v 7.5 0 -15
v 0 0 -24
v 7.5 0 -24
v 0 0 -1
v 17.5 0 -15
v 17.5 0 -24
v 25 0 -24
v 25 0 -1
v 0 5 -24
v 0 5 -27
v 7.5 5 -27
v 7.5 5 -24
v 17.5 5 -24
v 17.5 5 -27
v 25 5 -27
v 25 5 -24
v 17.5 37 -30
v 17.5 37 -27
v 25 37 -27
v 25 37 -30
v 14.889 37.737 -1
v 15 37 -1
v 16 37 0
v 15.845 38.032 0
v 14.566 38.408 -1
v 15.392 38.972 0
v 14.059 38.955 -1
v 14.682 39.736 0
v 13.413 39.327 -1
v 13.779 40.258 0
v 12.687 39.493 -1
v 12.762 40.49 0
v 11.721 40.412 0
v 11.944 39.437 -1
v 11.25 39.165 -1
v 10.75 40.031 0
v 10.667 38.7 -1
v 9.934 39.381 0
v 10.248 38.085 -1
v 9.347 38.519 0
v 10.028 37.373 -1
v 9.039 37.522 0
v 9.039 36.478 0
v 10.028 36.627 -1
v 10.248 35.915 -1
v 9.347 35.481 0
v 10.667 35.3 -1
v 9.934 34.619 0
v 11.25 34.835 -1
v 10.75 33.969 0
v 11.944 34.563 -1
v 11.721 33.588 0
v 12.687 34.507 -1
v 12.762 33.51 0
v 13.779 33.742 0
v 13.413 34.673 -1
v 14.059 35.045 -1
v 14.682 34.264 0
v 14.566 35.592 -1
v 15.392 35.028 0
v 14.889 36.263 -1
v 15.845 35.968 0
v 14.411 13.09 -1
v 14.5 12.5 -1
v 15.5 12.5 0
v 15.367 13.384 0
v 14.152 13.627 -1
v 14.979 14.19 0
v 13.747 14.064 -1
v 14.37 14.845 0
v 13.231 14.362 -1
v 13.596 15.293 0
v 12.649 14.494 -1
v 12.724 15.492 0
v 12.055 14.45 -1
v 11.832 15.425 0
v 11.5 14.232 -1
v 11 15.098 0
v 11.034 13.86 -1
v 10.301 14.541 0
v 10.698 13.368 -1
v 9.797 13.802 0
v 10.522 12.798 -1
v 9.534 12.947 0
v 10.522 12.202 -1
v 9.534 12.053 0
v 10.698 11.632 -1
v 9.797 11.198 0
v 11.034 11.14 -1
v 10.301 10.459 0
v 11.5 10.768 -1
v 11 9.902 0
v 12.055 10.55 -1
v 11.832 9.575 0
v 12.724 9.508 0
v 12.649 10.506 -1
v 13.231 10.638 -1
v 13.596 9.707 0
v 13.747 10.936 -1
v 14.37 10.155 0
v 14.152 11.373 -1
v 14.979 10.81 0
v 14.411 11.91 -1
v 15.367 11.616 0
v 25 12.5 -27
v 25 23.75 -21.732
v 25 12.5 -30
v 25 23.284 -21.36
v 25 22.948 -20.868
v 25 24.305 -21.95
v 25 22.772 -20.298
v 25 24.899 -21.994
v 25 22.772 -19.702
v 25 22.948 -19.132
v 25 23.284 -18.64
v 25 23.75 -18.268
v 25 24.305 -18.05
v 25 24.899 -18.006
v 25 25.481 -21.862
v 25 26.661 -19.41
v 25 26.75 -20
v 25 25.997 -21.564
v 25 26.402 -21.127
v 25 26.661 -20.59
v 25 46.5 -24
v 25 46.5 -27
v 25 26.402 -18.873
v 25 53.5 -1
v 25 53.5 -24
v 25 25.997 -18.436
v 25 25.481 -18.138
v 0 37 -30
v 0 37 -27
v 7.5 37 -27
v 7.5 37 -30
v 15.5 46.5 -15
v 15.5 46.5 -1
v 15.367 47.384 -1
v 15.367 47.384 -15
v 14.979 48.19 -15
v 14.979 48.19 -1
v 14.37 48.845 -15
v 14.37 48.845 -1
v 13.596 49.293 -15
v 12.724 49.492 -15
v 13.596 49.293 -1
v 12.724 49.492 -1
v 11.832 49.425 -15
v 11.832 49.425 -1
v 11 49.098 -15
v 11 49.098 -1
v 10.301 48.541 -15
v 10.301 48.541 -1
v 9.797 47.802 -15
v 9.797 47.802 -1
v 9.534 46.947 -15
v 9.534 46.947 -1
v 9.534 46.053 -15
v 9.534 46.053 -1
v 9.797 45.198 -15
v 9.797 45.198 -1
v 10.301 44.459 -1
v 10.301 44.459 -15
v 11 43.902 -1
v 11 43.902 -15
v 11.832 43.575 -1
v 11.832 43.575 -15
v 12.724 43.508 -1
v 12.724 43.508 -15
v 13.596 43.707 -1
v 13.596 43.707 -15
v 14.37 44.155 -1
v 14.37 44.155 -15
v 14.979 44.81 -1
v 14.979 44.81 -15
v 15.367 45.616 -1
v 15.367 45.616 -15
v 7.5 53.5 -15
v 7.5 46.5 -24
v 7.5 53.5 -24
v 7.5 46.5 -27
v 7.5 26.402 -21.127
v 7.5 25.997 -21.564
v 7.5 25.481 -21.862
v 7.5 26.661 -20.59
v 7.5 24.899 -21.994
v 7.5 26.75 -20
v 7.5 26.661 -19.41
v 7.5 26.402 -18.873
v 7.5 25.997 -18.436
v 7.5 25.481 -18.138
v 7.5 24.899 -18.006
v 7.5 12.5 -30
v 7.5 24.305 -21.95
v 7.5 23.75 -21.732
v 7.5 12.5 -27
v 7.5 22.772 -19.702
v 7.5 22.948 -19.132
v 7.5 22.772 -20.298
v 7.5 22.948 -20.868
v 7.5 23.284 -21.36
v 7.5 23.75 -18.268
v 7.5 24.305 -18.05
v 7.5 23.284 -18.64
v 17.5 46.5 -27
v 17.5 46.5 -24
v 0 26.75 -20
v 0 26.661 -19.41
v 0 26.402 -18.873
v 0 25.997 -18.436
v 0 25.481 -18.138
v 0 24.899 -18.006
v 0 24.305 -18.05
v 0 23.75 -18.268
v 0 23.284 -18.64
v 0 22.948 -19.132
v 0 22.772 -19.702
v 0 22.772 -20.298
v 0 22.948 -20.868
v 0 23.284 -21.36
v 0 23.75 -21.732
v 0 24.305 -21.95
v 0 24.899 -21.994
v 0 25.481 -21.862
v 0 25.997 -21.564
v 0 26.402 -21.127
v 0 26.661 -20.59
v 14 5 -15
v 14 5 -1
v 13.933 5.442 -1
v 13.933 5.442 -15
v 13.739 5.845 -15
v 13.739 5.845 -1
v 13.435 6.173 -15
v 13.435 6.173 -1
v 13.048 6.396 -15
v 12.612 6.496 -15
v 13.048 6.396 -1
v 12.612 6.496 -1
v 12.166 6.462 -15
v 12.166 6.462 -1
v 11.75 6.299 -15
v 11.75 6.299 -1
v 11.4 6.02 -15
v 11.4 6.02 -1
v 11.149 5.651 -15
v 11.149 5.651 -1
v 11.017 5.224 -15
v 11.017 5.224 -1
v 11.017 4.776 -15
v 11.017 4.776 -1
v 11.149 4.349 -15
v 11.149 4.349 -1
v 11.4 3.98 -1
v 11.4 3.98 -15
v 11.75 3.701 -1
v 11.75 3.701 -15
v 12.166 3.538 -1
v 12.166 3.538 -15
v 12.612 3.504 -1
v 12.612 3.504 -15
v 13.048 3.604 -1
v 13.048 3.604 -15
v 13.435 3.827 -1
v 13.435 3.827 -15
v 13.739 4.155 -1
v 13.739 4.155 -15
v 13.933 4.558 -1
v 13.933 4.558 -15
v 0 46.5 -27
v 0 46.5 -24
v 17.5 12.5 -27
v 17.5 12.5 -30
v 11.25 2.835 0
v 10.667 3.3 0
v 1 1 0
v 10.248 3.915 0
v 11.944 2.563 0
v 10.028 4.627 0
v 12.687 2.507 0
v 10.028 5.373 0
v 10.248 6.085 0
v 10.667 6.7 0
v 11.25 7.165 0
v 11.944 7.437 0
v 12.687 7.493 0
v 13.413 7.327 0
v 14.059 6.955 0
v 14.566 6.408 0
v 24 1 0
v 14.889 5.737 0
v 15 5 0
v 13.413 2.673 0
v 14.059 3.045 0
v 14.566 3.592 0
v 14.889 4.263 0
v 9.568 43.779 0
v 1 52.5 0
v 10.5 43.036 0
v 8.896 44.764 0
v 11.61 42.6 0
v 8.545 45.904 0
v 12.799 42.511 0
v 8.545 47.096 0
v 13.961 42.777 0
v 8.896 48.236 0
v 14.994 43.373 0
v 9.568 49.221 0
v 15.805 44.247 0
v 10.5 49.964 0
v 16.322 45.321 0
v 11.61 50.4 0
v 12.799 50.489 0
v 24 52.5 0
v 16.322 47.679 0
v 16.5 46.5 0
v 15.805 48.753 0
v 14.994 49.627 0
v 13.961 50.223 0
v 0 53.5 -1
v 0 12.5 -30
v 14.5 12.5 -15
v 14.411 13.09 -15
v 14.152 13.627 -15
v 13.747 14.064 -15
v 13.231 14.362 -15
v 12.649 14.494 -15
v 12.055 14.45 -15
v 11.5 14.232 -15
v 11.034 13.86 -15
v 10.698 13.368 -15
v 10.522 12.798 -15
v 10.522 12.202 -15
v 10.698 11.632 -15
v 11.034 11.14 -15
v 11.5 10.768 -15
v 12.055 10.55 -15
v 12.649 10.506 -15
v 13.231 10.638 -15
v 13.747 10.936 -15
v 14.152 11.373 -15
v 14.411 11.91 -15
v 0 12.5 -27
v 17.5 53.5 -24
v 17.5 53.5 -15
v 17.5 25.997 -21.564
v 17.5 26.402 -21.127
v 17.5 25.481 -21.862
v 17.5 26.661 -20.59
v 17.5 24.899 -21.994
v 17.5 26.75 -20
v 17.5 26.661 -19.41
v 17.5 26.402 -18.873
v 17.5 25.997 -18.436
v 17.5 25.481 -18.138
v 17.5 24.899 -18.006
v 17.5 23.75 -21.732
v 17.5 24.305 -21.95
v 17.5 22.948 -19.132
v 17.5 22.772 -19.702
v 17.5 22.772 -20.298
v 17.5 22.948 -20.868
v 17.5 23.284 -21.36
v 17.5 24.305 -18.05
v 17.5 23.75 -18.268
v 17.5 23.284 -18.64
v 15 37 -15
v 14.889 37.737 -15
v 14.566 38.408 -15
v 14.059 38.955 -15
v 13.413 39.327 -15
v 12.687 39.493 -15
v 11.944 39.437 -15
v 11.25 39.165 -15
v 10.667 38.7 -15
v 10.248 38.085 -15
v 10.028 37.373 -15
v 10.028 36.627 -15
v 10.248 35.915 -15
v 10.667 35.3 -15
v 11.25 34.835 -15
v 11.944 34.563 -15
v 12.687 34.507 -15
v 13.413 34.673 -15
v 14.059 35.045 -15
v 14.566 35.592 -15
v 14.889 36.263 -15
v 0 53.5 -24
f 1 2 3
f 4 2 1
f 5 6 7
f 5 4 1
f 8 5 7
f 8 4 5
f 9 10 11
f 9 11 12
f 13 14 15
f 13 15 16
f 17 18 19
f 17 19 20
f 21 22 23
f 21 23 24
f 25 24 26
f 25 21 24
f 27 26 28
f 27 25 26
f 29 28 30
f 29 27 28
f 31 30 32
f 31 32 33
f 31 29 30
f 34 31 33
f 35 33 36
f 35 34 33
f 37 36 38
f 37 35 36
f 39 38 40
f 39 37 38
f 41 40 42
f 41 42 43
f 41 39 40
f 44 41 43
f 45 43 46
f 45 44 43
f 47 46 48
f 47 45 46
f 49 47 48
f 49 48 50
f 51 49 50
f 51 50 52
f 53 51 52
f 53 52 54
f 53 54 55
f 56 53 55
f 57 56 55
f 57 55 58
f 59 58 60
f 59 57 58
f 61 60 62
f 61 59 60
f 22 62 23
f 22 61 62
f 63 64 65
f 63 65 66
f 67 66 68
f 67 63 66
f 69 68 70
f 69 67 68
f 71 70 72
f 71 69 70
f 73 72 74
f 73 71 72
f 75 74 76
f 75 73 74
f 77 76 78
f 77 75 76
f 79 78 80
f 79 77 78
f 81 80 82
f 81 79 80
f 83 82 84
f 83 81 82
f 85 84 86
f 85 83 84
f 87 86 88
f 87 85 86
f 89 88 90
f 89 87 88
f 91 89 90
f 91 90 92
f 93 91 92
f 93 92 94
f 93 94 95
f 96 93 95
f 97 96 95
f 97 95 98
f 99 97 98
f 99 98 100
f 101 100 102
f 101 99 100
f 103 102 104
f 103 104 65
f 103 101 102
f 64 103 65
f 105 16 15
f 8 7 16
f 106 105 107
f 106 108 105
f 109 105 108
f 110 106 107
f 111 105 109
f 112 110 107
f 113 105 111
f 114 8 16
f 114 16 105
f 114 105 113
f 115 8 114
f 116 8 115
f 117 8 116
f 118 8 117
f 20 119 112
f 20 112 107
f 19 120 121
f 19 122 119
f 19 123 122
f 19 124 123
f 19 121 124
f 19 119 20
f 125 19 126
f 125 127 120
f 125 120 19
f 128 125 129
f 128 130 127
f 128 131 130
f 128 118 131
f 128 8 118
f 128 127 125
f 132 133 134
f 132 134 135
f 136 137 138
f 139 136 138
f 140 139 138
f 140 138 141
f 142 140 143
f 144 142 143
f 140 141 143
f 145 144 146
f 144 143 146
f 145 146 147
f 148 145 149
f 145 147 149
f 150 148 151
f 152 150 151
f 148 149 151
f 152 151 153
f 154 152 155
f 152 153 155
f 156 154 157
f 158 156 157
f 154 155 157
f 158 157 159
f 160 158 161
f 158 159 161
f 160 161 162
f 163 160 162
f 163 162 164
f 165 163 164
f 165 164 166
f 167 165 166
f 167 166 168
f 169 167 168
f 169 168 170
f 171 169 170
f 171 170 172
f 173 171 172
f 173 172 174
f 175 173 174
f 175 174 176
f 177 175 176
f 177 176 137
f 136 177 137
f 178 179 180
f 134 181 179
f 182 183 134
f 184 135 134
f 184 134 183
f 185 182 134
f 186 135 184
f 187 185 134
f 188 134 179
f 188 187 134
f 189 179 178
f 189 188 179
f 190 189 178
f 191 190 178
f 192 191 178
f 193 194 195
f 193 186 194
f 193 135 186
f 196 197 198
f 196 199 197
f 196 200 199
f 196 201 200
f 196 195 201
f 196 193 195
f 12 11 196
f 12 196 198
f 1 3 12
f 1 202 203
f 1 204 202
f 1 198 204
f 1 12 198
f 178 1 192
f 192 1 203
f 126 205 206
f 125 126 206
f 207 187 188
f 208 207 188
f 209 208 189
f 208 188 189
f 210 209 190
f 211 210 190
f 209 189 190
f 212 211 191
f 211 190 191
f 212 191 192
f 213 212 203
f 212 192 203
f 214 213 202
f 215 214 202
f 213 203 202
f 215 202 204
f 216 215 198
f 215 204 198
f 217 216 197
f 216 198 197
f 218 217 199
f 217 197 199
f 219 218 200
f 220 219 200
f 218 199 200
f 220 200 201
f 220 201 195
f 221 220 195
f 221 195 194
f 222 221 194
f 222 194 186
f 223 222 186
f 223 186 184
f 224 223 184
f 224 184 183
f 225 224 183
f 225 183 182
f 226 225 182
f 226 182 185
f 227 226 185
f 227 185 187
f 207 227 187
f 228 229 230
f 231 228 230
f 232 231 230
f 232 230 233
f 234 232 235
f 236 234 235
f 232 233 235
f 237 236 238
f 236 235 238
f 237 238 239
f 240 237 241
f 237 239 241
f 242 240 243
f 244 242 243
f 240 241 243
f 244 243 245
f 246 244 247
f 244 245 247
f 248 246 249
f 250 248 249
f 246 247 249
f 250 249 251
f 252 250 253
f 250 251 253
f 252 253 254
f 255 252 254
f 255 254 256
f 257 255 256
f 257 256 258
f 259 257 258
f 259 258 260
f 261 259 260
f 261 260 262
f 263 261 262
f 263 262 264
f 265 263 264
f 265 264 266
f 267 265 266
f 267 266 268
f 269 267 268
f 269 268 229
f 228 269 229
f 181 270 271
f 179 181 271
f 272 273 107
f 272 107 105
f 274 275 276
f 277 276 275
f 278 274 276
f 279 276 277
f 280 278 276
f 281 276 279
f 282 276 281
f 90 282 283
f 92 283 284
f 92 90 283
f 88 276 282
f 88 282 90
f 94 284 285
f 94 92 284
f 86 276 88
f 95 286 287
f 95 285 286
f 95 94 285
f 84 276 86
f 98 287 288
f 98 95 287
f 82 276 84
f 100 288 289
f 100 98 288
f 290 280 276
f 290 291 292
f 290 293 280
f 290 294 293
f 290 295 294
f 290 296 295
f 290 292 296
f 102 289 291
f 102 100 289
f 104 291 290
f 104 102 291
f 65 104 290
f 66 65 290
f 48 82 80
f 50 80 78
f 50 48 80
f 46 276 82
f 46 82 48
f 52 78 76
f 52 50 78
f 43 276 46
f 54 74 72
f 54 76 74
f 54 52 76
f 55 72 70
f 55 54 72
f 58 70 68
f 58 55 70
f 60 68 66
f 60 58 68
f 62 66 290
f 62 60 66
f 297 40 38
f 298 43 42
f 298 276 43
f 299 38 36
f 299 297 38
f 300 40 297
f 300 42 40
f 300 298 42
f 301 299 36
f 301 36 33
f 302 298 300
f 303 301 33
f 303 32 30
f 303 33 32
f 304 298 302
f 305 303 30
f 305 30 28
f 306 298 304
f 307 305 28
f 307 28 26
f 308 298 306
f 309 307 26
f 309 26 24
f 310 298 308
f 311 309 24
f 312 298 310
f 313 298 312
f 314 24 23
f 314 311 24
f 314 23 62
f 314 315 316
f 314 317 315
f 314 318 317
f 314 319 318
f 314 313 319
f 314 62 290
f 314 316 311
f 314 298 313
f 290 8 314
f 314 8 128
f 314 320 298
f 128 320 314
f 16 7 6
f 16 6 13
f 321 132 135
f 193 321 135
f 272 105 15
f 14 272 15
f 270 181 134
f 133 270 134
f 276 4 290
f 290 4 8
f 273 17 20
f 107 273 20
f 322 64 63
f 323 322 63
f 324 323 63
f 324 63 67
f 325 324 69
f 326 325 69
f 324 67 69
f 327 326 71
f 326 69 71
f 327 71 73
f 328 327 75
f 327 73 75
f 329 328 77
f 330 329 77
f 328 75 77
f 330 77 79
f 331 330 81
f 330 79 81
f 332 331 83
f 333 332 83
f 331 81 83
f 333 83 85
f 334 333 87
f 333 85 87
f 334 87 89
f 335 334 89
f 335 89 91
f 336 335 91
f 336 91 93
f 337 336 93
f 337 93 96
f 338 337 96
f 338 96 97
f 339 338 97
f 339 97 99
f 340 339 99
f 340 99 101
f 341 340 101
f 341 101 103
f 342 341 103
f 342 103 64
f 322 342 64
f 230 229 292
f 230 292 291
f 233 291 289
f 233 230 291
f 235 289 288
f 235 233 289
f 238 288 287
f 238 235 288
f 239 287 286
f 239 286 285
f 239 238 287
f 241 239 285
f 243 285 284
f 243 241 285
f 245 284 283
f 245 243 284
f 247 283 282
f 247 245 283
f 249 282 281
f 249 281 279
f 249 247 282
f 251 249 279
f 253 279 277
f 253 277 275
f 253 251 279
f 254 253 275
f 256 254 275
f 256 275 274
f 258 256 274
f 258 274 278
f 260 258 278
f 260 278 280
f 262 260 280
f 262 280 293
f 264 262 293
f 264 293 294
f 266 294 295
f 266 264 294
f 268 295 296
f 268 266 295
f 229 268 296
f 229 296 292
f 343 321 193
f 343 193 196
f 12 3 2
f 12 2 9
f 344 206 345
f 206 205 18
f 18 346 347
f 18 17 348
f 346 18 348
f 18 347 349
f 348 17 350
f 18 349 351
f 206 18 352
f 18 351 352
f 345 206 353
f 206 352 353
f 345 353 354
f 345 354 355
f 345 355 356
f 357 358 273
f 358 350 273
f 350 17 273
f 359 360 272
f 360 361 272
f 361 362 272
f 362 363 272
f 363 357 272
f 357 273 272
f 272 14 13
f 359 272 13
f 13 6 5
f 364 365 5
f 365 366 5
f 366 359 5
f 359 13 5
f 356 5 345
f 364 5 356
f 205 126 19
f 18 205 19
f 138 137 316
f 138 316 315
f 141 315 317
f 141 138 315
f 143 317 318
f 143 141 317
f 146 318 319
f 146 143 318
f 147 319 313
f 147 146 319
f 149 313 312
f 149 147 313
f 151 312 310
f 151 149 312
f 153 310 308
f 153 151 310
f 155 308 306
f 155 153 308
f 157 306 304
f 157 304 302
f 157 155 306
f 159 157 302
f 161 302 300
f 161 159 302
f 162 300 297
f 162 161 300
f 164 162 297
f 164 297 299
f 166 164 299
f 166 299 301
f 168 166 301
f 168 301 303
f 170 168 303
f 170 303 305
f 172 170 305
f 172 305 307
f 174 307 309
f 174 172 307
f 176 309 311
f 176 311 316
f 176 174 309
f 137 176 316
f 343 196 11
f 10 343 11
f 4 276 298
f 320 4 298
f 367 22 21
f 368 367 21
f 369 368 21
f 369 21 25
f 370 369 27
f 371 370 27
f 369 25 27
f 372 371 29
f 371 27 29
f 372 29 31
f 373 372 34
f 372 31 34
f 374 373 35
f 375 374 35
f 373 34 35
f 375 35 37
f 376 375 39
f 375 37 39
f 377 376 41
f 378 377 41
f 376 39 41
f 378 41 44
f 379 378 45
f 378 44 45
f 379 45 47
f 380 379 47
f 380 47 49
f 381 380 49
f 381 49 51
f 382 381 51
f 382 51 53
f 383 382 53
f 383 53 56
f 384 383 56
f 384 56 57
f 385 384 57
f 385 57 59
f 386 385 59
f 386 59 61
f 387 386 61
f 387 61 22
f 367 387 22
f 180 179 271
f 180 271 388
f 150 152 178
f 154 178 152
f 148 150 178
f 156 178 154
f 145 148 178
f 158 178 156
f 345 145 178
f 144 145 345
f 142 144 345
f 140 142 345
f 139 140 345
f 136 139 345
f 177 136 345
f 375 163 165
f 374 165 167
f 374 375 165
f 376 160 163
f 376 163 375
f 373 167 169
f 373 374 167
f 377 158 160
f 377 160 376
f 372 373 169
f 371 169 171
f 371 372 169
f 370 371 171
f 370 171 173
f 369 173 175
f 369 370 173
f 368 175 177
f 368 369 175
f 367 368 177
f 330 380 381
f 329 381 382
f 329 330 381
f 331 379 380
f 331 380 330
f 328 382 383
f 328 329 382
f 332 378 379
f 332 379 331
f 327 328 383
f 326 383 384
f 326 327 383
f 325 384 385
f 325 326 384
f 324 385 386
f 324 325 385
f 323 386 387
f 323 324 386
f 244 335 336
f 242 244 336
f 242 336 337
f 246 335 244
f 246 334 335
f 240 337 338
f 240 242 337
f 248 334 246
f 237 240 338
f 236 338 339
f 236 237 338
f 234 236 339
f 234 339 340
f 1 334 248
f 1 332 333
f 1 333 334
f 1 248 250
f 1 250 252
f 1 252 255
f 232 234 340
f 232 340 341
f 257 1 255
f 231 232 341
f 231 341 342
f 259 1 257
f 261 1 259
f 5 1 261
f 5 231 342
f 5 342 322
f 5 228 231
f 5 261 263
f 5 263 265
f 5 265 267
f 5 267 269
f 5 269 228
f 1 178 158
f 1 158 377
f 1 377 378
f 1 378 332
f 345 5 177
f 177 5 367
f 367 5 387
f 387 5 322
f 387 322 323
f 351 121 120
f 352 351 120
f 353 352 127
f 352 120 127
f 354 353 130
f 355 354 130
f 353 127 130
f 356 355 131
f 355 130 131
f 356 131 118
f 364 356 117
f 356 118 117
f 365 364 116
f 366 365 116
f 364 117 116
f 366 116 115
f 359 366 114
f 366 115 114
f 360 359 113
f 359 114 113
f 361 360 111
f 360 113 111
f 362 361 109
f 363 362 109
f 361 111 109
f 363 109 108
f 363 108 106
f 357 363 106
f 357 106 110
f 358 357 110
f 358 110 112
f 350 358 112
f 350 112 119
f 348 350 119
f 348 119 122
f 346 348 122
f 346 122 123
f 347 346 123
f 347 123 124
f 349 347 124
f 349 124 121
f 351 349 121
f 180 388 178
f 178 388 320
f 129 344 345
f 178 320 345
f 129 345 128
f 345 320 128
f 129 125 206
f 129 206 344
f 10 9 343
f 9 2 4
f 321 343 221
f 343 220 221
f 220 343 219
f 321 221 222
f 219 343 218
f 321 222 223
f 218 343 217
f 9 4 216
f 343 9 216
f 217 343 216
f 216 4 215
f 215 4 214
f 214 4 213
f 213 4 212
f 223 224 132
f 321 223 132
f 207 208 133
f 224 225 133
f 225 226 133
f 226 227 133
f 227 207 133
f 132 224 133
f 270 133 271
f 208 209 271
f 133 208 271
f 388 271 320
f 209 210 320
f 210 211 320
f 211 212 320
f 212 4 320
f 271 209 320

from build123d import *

# Parameters (mm, degrees)
F0_W     = 25
F0_H     = 53.5
F0_R     = 1.5
F0_R_2   = 2
F0_R_3   = 2.5
F0_R_4   = 3
F1_DEPTH = 30
F2_W     = 10
F2_H     = 15
F3_DEPTH = 53.501
F4_W     = 7
F4_H     = 3
F4_W_2   = 5
F5_DEPTH = 25.001
F6_SIZE  = 1
F7_R     = 2
F8_DEPTH = 25.001


with BuildPart() as f1:
    # F0 (on Top) → F1 (new body)
    with BuildSketch(Plane.XY):
        with Locations((12.5, 26.75)):
            Rectangle(F0_W, F0_H)
        with Locations((12.5, 5)):
            Circle(F0_R, mode=Mode.SUBTRACT)
        with Locations((12.5, 12.5)):
            Circle(F0_R_2, mode=Mode.SUBTRACT)
        with Locations((12.5, 37)):
            Circle(F0_R_3, mode=Mode.SUBTRACT)
        with Locations((12.5, 46.5)):
            Circle(F0_R_4, mode=Mode.SUBTRACT)
    extrude(amount=-F1_DEPTH)

    # F2 (on face) → F3 (cut, through all)
    with BuildSketch(Plane.XZ):
        with Locations((12.5, -22.5)):
            Rectangle(F2_W, F2_H)
    extrude(amount=-F3_DEPTH, mode=Mode.SUBTRACT)

    # F4 (on face) → F5 (cut, through all)
    with BuildSketch(Plane.YZ.offset(25)):
        with Locations((50, -25.5)):
            Rectangle(F4_W, F4_H)
        Polygon((37, -30), (53.5, -30), (53.5, -27), (46.5, -27), (37, -27), align=None)
        Polygon((0, -30), (12.5, -30), (12.5, -27), (5, -27), (0, -27), align=None)
        with Locations((2.5, -25.5)):
            Rectangle(F4_W_2, F4_H)
    extrude(amount=-F5_DEPTH, mode=Mode.SUBTRACT)

    # F6
    f6_edges = [f1.edges().sort_by_distance(p)[0] for p in [
        (11, 5, 0),
        (10.5, 12.5, 0),
        (10, 37, 0),
        (9.5, 46.5, 0),
        (12.5, 0, 0),
        (0, 26.75, 0),
        (25, 26.75, 0),
        (12.5, 53.5, 0),
    ]]
    chamfer(f6_edges, length=F6_SIZE)

    # F7 (on face) → F8 (cut, through all)
    with BuildSketch(Plane.YZ.offset(25)):
        with Locations((24.75, -20)):
            Circle(F7_R)
    extrude(amount=-F8_DEPTH, mode=Mode.SUBTRACT)


solid = f1.part
